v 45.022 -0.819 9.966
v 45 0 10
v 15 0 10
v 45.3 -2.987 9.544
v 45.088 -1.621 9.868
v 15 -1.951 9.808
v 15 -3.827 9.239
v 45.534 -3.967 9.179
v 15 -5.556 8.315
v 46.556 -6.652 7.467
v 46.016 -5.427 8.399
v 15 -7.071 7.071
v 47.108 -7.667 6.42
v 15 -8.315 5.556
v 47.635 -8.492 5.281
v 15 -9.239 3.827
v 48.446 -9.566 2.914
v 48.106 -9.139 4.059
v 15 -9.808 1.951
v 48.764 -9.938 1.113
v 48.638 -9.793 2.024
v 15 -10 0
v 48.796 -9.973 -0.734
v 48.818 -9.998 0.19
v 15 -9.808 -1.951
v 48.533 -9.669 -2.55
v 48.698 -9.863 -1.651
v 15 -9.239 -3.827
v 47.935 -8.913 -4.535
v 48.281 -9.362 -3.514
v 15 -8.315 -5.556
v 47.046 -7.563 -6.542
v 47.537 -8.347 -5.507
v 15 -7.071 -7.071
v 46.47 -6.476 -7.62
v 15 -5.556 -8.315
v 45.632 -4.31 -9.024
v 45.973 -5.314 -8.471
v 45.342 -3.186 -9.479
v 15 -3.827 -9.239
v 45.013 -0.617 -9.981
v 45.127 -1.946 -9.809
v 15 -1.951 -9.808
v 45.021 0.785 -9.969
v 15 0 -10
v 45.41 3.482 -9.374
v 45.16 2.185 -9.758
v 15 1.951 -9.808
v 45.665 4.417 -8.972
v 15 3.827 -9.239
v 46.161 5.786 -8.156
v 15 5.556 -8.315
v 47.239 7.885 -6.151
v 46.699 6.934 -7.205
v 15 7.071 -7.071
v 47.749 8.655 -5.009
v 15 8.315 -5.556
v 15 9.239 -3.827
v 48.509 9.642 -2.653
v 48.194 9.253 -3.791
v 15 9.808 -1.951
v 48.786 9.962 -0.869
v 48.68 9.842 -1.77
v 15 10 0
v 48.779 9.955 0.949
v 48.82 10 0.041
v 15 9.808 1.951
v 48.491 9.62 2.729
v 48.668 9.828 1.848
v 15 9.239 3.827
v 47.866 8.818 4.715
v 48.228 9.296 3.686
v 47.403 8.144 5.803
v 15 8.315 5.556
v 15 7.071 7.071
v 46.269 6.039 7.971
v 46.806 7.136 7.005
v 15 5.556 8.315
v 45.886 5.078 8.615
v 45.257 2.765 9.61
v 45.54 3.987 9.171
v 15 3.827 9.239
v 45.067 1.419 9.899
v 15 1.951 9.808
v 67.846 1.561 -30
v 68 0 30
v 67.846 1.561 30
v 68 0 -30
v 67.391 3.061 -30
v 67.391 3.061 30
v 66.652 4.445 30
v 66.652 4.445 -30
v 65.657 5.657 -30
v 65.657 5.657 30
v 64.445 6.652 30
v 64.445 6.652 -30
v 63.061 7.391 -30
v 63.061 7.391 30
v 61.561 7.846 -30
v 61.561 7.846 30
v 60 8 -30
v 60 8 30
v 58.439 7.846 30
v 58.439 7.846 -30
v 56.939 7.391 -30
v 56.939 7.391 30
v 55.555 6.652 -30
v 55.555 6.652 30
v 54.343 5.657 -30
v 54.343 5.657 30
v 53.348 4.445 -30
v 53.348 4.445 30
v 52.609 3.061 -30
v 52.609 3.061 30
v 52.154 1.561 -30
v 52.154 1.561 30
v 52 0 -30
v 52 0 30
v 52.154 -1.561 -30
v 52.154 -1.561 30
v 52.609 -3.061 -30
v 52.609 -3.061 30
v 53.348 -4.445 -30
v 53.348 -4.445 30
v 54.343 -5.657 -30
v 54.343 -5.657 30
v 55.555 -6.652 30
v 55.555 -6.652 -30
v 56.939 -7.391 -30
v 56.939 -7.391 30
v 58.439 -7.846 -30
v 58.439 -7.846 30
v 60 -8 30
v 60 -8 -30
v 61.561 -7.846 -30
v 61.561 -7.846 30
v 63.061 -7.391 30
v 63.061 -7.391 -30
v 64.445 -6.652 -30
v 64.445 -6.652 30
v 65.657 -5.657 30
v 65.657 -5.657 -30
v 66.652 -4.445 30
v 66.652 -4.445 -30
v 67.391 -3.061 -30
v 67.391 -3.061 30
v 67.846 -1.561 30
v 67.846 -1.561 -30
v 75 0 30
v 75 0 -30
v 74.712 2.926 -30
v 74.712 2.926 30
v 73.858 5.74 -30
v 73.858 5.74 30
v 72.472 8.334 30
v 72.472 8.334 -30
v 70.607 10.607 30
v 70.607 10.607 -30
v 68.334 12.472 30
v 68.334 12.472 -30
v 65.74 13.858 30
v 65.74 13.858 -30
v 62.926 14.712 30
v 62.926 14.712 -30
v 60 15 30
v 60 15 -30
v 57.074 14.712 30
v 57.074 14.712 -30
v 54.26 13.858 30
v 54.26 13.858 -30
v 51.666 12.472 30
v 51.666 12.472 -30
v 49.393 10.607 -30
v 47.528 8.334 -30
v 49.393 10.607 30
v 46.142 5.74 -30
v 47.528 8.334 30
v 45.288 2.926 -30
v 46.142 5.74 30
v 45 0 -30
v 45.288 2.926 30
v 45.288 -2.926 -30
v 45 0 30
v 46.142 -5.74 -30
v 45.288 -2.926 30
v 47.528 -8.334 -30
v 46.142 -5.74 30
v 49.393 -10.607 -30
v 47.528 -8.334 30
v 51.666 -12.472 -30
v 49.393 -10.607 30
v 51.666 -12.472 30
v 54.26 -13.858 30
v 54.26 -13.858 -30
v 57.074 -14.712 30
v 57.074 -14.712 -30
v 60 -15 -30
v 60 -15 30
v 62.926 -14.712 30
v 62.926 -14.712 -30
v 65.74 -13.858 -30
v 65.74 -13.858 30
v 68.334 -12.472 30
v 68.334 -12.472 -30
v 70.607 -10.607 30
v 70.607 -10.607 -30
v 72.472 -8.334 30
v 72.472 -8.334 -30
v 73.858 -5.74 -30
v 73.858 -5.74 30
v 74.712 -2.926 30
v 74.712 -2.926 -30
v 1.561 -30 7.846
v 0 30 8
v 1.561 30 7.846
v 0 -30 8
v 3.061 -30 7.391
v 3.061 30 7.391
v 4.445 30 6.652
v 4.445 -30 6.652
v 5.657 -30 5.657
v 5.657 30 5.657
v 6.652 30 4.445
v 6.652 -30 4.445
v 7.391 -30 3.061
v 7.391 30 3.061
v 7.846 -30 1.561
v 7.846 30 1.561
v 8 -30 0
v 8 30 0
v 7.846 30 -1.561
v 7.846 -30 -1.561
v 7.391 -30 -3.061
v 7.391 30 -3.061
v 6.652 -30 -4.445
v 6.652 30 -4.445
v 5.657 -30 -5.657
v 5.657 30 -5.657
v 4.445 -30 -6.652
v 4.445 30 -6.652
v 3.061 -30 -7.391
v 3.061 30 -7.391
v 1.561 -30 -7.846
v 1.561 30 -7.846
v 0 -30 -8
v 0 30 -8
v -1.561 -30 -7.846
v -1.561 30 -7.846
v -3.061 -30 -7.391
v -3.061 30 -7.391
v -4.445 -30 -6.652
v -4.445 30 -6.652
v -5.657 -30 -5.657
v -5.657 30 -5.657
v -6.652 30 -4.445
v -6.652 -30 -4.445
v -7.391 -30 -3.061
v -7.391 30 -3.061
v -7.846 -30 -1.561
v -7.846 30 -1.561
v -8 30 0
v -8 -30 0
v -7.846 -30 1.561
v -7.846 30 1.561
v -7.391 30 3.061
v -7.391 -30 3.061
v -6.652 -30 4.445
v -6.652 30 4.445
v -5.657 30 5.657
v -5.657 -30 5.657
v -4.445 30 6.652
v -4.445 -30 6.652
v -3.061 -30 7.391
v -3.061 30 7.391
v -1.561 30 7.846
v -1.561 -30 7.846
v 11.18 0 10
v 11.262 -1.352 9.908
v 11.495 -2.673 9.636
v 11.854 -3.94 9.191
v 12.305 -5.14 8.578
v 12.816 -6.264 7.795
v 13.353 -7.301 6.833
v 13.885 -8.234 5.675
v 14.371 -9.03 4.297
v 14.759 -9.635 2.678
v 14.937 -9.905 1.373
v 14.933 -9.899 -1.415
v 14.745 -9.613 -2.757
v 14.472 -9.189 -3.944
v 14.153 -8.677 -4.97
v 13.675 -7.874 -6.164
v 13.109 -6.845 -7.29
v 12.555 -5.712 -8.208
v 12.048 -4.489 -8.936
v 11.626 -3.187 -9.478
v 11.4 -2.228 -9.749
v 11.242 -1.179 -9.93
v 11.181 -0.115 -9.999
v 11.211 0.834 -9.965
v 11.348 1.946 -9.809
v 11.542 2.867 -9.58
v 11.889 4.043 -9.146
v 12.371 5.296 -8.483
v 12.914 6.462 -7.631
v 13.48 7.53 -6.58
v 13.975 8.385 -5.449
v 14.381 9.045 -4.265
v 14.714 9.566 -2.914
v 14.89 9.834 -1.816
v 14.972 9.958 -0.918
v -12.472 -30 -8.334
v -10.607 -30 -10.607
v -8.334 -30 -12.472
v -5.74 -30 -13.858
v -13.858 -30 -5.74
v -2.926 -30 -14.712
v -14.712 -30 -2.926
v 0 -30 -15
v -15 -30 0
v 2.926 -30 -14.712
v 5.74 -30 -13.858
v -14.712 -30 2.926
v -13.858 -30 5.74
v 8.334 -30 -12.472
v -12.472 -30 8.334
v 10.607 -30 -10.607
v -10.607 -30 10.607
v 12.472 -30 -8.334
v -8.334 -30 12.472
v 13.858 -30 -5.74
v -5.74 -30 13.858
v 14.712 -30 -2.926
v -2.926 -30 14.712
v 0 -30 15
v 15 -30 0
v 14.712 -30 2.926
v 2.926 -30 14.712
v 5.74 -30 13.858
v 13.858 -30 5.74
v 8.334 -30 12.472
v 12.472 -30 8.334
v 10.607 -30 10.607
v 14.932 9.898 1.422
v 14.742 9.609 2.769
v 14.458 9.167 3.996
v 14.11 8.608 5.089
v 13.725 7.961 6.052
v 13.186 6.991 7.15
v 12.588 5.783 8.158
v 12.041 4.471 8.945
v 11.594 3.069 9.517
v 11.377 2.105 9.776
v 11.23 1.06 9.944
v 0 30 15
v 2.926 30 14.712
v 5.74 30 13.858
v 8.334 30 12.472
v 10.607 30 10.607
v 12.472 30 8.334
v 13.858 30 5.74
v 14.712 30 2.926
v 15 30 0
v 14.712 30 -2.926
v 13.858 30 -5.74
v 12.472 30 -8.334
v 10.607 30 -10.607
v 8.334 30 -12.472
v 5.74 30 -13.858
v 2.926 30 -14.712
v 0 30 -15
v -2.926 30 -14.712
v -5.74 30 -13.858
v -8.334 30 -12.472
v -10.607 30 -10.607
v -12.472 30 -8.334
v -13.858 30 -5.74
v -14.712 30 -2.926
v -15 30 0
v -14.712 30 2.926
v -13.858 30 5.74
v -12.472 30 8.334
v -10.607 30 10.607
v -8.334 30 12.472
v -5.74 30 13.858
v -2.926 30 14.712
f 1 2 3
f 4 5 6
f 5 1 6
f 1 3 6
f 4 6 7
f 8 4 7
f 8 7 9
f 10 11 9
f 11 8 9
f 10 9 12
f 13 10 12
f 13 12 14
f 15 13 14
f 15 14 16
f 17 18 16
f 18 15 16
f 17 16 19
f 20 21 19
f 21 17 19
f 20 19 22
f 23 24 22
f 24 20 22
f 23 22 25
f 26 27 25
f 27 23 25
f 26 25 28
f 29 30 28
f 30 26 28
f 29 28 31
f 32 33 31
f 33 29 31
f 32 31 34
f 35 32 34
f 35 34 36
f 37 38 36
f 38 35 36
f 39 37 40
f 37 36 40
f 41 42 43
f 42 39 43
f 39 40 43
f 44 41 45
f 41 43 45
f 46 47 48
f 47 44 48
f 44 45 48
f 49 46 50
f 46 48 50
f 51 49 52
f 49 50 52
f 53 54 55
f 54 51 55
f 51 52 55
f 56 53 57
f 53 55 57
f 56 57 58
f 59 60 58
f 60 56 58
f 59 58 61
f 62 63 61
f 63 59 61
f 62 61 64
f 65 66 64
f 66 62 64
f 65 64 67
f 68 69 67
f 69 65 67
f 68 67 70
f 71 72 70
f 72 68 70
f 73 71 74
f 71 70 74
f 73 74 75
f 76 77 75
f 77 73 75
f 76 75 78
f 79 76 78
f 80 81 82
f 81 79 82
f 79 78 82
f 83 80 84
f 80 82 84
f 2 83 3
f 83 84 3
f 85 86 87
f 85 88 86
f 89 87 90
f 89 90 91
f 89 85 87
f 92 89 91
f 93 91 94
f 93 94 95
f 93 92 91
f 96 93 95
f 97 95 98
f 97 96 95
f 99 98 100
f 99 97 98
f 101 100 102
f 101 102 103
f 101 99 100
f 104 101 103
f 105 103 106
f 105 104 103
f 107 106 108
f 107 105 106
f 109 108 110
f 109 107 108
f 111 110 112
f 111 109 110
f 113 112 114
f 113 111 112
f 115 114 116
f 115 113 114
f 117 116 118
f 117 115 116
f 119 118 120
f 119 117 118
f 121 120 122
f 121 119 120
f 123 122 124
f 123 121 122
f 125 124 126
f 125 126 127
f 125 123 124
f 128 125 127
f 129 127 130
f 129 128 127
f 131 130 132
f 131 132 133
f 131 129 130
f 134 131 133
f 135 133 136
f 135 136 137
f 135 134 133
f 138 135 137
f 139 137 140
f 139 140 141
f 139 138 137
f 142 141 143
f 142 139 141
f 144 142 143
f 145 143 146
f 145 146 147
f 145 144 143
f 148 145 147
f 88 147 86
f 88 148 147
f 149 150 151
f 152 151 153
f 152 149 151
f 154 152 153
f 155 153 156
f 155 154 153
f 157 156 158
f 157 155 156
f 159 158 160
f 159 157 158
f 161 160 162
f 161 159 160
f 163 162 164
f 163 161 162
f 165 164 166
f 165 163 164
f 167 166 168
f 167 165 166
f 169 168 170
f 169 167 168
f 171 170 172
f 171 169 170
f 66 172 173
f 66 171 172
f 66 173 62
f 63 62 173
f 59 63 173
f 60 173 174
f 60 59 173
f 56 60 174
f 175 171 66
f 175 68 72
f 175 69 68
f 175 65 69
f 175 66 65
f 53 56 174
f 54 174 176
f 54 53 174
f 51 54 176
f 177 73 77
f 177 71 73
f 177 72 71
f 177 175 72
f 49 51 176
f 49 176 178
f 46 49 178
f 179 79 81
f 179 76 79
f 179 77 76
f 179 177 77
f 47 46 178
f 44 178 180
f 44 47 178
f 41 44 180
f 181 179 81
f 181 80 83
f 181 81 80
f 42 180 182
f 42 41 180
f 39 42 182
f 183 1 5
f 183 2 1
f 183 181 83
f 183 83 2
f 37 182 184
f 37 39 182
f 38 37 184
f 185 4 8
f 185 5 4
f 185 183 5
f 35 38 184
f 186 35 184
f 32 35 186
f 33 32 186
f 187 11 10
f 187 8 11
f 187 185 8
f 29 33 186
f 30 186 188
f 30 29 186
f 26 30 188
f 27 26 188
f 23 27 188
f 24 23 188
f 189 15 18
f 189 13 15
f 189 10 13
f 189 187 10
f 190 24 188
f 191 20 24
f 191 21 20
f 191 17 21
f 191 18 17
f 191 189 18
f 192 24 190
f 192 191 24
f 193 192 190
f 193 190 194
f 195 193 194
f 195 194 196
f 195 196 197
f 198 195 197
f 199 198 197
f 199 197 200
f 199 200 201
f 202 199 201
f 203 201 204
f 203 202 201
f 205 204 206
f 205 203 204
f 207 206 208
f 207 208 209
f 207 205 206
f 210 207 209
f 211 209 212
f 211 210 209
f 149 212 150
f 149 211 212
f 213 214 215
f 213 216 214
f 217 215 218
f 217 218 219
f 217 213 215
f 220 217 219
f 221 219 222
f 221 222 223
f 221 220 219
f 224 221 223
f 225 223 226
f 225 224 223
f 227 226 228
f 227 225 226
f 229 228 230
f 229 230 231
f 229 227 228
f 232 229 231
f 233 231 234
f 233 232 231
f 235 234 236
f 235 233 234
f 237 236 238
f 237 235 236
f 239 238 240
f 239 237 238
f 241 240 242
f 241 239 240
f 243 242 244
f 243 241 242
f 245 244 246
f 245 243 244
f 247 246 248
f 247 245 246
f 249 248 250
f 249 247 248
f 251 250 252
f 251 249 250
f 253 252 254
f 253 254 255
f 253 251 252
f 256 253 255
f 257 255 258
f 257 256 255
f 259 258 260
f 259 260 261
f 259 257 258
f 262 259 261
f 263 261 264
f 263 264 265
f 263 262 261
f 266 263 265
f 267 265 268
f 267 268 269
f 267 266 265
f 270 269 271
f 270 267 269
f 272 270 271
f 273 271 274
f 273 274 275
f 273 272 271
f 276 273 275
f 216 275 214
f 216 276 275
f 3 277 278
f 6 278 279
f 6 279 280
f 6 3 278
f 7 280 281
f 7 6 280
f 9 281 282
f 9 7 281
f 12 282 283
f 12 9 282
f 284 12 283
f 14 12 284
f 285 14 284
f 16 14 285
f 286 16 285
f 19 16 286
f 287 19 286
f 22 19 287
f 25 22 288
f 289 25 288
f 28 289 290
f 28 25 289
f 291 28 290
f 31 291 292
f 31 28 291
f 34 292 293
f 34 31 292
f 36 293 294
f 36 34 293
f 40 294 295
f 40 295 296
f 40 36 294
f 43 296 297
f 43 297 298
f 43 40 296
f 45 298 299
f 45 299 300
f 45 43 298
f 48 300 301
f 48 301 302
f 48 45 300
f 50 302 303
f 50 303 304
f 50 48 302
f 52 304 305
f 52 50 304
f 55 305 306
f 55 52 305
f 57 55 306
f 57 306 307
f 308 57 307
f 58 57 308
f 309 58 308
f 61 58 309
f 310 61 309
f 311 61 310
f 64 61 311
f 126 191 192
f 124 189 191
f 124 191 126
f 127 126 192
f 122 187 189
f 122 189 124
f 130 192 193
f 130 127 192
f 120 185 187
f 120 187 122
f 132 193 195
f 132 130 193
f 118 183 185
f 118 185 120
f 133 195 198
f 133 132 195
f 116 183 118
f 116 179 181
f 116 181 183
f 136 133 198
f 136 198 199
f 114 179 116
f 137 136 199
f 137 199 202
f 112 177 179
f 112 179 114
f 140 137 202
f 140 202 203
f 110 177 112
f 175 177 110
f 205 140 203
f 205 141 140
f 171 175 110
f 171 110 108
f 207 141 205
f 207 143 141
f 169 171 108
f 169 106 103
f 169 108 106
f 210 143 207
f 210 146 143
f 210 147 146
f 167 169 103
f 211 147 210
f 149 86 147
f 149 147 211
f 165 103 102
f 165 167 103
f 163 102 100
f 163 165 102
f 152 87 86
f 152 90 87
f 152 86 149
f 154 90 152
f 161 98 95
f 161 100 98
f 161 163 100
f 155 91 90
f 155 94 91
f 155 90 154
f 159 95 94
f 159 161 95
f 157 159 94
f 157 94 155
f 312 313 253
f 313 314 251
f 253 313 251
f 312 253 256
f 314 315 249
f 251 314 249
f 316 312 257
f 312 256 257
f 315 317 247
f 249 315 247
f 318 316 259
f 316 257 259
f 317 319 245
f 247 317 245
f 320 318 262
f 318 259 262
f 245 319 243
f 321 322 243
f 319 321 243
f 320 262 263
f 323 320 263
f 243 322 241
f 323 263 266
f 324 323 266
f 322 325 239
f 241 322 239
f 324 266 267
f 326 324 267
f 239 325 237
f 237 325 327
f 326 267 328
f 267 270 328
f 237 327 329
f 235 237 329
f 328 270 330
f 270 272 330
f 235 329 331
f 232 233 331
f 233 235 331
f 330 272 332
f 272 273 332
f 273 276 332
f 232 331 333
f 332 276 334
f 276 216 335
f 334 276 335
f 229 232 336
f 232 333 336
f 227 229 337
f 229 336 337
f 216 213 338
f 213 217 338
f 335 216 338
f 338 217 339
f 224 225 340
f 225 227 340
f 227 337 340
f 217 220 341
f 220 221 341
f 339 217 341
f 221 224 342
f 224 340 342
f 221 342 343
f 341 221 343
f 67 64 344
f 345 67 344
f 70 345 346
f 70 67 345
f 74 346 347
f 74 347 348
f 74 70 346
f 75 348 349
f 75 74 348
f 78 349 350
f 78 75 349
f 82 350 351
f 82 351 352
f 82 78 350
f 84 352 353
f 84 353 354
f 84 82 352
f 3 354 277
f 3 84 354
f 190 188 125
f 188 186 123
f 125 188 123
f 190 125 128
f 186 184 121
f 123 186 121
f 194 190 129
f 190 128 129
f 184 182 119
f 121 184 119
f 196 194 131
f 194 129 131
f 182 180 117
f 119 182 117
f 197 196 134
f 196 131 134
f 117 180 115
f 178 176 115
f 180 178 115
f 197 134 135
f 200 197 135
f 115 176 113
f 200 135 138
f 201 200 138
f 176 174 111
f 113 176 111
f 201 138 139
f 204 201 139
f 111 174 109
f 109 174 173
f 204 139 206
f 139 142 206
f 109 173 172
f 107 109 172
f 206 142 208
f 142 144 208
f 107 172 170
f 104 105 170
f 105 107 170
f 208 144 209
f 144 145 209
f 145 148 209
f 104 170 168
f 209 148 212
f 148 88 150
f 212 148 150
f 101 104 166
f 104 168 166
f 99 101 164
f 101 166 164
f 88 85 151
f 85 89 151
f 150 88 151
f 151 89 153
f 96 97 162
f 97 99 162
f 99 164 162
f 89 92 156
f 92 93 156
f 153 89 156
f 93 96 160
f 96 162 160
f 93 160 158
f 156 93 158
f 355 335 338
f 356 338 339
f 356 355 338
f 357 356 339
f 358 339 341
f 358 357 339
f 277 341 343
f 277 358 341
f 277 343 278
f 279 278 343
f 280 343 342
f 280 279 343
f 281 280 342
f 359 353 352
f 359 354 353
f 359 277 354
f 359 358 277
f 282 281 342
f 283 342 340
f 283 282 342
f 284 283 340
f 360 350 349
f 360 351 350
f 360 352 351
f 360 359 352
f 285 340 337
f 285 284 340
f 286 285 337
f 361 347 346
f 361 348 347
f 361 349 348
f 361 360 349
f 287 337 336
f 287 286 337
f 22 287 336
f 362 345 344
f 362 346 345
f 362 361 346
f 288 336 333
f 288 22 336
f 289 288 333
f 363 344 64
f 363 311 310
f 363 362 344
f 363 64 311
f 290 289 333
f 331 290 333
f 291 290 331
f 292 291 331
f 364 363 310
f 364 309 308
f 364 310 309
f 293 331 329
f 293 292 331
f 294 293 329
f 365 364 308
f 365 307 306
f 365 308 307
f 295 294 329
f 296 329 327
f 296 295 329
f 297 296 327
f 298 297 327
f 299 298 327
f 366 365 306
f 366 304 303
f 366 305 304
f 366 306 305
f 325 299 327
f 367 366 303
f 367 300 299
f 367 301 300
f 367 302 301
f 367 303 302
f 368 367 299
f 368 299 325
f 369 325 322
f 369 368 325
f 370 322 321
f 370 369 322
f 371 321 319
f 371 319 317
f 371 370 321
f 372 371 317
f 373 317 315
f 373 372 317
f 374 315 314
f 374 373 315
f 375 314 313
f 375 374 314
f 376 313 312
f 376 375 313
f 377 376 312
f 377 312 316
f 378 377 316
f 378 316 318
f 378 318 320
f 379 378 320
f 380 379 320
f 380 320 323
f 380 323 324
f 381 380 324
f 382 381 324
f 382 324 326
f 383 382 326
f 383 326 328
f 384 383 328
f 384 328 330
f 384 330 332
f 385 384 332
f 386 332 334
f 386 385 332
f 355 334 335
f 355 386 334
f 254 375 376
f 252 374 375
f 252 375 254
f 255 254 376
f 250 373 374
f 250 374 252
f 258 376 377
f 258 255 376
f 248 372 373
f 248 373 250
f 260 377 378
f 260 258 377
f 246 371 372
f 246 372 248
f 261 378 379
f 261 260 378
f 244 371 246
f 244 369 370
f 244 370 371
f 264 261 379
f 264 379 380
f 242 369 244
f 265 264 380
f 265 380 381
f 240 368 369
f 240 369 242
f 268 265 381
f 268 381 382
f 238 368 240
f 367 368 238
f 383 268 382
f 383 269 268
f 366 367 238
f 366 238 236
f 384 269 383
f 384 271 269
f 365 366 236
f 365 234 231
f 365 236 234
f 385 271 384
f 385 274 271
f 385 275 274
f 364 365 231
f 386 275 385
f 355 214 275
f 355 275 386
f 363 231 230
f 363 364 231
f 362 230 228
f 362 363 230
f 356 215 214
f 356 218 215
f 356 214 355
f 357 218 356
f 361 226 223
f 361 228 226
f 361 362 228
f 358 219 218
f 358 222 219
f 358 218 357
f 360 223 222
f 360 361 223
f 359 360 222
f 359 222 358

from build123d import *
from build123d.topology import SkipClean

# Parameters (mm, degrees)
SKETCH1_R                            = 15
SKETCH1_R_2                          = 8
BOSS_EXTRUDE1_DEPTH                  = 30
SKETCH3_R                            = 15
SKETCH3_R_2                          = 8
BOSS_EXTRUDE3_DEPTH                  = 30
BOSS_EXTRUDE4_REACH                  = 75.485
BOSS_EXTRUDE4_END_RADIUS             = 15
SKETCH4_R                            = 10
BOSS_EXTRUDE4_DIRECTION_2_REACH      = 75.485
BOSS_EXTRUDE4_DIRECTION_2_END_RADIUS = 15


with BuildPart() as part:
    # Sketch1 → Boss-Extrude1 (new, symmetric)
    with BuildSketch(Plane(origin=(0, 0, 0), x_dir=(1, 0, 0), z_dir=(0, 1, 0))):
        with Locations(Location((0, 0, 0), (0, 0, 270))):
            Circle(SKETCH1_R)
        with Locations(Location((0, 0, 0), (0, 0, 270))):
            Circle(SKETCH1_R_2, mode=Mode.SUBTRACT)
    extrude(amount=BOSS_EXTRUDE1_DEPTH, both=True)



with BuildPart() as body_2:
    # Sketch3 → Boss-Extrude3 (new, symmetric)
    with BuildSketch(Plane.XY):
        with Locations((60, 0)):
            Circle(SKETCH3_R)
        with Locations((60, 0)):
            Circle(SKETCH3_R_2, mode=Mode.SUBTRACT)
    extrude(amount=BOSS_EXTRUDE3_DEPTH, both=True)


with BuildPart() as part_1:
    add(part.part)

    add(body_2.part)  # Boss-Extrude4 merges body 2
    # Boss-Extrude4: up to this cylinder (the profile starts outside it)
    boss_extrude4_end = Plane(origin=(60, 0, 0), z_dir=(0, 0, -1)) * Cylinder(BOSS_EXTRUDE4_END_RADIUS, 181.97, mode=Mode.PRIVATE)
    # Sketch4 → Boss-Extrude4 (add, up to the surface)
    with BuildSketch(Plane(origin=(15, 0, 0), x_dir=(0, 0, -1), z_dir=(1, 0, 0)), mode=Mode.PRIVATE) as boss_extrude4_sk1:
        with Locations(Location((0, 0, 0), (0, 0, 180))):
            Circle(SKETCH4_R)
    boss_extrude4_tool1 = extrude(boss_extrude4_sk1.sketch, amount=BOSS_EXTRUDE4_REACH, mode=Mode.PRIVATE) - boss_extrude4_end
    add(boss_extrude4_tool1.solids().sort_by_distance((15, 0, 0))[0])

    # Boss-Extrude4 direction 2: up to this cylinder (the profile starts outside it)
    with SkipClean():  # the faces are left unmerged after this step: merging them gives an invalid solid
        boss_extrude4_direction_2_end = Plane(origin=(0, 0, 0), z_dir=(0, -1, 0)) * Cylinder(BOSS_EXTRUDE4_DIRECTION_2_END_RADIUS, 181.97, mode=Mode.PRIVATE)
        # Sketch4 → Boss-Extrude4 direction 2 (add, up to the surface)
        with BuildSketch(Plane(origin=(15, 0, 0), x_dir=(0, 0, -1), z_dir=(1, 0, 0)), mode=Mode.PRIVATE) as boss_extrude4_direction_2_sk1:
            with Locations(Location((0, 0, 0), (0, 0, 180))):
                Circle(SKETCH4_R)
        boss_extrude4_direction_2_tool1 = extrude(boss_extrude4_direction_2_sk1.sketch, amount=-BOSS_EXTRUDE4_DIRECTION_2_REACH, mode=Mode.PRIVATE) - boss_extrude4_direction_2_end
        add(boss_extrude4_direction_2_tool1.solids().sort_by_distance((15, 0, 0))[0])
        add(boss_extrude4_direction_2_tool1.solids().sort_by_distance((15, 0, 0))[1])


solid = part_1.part
